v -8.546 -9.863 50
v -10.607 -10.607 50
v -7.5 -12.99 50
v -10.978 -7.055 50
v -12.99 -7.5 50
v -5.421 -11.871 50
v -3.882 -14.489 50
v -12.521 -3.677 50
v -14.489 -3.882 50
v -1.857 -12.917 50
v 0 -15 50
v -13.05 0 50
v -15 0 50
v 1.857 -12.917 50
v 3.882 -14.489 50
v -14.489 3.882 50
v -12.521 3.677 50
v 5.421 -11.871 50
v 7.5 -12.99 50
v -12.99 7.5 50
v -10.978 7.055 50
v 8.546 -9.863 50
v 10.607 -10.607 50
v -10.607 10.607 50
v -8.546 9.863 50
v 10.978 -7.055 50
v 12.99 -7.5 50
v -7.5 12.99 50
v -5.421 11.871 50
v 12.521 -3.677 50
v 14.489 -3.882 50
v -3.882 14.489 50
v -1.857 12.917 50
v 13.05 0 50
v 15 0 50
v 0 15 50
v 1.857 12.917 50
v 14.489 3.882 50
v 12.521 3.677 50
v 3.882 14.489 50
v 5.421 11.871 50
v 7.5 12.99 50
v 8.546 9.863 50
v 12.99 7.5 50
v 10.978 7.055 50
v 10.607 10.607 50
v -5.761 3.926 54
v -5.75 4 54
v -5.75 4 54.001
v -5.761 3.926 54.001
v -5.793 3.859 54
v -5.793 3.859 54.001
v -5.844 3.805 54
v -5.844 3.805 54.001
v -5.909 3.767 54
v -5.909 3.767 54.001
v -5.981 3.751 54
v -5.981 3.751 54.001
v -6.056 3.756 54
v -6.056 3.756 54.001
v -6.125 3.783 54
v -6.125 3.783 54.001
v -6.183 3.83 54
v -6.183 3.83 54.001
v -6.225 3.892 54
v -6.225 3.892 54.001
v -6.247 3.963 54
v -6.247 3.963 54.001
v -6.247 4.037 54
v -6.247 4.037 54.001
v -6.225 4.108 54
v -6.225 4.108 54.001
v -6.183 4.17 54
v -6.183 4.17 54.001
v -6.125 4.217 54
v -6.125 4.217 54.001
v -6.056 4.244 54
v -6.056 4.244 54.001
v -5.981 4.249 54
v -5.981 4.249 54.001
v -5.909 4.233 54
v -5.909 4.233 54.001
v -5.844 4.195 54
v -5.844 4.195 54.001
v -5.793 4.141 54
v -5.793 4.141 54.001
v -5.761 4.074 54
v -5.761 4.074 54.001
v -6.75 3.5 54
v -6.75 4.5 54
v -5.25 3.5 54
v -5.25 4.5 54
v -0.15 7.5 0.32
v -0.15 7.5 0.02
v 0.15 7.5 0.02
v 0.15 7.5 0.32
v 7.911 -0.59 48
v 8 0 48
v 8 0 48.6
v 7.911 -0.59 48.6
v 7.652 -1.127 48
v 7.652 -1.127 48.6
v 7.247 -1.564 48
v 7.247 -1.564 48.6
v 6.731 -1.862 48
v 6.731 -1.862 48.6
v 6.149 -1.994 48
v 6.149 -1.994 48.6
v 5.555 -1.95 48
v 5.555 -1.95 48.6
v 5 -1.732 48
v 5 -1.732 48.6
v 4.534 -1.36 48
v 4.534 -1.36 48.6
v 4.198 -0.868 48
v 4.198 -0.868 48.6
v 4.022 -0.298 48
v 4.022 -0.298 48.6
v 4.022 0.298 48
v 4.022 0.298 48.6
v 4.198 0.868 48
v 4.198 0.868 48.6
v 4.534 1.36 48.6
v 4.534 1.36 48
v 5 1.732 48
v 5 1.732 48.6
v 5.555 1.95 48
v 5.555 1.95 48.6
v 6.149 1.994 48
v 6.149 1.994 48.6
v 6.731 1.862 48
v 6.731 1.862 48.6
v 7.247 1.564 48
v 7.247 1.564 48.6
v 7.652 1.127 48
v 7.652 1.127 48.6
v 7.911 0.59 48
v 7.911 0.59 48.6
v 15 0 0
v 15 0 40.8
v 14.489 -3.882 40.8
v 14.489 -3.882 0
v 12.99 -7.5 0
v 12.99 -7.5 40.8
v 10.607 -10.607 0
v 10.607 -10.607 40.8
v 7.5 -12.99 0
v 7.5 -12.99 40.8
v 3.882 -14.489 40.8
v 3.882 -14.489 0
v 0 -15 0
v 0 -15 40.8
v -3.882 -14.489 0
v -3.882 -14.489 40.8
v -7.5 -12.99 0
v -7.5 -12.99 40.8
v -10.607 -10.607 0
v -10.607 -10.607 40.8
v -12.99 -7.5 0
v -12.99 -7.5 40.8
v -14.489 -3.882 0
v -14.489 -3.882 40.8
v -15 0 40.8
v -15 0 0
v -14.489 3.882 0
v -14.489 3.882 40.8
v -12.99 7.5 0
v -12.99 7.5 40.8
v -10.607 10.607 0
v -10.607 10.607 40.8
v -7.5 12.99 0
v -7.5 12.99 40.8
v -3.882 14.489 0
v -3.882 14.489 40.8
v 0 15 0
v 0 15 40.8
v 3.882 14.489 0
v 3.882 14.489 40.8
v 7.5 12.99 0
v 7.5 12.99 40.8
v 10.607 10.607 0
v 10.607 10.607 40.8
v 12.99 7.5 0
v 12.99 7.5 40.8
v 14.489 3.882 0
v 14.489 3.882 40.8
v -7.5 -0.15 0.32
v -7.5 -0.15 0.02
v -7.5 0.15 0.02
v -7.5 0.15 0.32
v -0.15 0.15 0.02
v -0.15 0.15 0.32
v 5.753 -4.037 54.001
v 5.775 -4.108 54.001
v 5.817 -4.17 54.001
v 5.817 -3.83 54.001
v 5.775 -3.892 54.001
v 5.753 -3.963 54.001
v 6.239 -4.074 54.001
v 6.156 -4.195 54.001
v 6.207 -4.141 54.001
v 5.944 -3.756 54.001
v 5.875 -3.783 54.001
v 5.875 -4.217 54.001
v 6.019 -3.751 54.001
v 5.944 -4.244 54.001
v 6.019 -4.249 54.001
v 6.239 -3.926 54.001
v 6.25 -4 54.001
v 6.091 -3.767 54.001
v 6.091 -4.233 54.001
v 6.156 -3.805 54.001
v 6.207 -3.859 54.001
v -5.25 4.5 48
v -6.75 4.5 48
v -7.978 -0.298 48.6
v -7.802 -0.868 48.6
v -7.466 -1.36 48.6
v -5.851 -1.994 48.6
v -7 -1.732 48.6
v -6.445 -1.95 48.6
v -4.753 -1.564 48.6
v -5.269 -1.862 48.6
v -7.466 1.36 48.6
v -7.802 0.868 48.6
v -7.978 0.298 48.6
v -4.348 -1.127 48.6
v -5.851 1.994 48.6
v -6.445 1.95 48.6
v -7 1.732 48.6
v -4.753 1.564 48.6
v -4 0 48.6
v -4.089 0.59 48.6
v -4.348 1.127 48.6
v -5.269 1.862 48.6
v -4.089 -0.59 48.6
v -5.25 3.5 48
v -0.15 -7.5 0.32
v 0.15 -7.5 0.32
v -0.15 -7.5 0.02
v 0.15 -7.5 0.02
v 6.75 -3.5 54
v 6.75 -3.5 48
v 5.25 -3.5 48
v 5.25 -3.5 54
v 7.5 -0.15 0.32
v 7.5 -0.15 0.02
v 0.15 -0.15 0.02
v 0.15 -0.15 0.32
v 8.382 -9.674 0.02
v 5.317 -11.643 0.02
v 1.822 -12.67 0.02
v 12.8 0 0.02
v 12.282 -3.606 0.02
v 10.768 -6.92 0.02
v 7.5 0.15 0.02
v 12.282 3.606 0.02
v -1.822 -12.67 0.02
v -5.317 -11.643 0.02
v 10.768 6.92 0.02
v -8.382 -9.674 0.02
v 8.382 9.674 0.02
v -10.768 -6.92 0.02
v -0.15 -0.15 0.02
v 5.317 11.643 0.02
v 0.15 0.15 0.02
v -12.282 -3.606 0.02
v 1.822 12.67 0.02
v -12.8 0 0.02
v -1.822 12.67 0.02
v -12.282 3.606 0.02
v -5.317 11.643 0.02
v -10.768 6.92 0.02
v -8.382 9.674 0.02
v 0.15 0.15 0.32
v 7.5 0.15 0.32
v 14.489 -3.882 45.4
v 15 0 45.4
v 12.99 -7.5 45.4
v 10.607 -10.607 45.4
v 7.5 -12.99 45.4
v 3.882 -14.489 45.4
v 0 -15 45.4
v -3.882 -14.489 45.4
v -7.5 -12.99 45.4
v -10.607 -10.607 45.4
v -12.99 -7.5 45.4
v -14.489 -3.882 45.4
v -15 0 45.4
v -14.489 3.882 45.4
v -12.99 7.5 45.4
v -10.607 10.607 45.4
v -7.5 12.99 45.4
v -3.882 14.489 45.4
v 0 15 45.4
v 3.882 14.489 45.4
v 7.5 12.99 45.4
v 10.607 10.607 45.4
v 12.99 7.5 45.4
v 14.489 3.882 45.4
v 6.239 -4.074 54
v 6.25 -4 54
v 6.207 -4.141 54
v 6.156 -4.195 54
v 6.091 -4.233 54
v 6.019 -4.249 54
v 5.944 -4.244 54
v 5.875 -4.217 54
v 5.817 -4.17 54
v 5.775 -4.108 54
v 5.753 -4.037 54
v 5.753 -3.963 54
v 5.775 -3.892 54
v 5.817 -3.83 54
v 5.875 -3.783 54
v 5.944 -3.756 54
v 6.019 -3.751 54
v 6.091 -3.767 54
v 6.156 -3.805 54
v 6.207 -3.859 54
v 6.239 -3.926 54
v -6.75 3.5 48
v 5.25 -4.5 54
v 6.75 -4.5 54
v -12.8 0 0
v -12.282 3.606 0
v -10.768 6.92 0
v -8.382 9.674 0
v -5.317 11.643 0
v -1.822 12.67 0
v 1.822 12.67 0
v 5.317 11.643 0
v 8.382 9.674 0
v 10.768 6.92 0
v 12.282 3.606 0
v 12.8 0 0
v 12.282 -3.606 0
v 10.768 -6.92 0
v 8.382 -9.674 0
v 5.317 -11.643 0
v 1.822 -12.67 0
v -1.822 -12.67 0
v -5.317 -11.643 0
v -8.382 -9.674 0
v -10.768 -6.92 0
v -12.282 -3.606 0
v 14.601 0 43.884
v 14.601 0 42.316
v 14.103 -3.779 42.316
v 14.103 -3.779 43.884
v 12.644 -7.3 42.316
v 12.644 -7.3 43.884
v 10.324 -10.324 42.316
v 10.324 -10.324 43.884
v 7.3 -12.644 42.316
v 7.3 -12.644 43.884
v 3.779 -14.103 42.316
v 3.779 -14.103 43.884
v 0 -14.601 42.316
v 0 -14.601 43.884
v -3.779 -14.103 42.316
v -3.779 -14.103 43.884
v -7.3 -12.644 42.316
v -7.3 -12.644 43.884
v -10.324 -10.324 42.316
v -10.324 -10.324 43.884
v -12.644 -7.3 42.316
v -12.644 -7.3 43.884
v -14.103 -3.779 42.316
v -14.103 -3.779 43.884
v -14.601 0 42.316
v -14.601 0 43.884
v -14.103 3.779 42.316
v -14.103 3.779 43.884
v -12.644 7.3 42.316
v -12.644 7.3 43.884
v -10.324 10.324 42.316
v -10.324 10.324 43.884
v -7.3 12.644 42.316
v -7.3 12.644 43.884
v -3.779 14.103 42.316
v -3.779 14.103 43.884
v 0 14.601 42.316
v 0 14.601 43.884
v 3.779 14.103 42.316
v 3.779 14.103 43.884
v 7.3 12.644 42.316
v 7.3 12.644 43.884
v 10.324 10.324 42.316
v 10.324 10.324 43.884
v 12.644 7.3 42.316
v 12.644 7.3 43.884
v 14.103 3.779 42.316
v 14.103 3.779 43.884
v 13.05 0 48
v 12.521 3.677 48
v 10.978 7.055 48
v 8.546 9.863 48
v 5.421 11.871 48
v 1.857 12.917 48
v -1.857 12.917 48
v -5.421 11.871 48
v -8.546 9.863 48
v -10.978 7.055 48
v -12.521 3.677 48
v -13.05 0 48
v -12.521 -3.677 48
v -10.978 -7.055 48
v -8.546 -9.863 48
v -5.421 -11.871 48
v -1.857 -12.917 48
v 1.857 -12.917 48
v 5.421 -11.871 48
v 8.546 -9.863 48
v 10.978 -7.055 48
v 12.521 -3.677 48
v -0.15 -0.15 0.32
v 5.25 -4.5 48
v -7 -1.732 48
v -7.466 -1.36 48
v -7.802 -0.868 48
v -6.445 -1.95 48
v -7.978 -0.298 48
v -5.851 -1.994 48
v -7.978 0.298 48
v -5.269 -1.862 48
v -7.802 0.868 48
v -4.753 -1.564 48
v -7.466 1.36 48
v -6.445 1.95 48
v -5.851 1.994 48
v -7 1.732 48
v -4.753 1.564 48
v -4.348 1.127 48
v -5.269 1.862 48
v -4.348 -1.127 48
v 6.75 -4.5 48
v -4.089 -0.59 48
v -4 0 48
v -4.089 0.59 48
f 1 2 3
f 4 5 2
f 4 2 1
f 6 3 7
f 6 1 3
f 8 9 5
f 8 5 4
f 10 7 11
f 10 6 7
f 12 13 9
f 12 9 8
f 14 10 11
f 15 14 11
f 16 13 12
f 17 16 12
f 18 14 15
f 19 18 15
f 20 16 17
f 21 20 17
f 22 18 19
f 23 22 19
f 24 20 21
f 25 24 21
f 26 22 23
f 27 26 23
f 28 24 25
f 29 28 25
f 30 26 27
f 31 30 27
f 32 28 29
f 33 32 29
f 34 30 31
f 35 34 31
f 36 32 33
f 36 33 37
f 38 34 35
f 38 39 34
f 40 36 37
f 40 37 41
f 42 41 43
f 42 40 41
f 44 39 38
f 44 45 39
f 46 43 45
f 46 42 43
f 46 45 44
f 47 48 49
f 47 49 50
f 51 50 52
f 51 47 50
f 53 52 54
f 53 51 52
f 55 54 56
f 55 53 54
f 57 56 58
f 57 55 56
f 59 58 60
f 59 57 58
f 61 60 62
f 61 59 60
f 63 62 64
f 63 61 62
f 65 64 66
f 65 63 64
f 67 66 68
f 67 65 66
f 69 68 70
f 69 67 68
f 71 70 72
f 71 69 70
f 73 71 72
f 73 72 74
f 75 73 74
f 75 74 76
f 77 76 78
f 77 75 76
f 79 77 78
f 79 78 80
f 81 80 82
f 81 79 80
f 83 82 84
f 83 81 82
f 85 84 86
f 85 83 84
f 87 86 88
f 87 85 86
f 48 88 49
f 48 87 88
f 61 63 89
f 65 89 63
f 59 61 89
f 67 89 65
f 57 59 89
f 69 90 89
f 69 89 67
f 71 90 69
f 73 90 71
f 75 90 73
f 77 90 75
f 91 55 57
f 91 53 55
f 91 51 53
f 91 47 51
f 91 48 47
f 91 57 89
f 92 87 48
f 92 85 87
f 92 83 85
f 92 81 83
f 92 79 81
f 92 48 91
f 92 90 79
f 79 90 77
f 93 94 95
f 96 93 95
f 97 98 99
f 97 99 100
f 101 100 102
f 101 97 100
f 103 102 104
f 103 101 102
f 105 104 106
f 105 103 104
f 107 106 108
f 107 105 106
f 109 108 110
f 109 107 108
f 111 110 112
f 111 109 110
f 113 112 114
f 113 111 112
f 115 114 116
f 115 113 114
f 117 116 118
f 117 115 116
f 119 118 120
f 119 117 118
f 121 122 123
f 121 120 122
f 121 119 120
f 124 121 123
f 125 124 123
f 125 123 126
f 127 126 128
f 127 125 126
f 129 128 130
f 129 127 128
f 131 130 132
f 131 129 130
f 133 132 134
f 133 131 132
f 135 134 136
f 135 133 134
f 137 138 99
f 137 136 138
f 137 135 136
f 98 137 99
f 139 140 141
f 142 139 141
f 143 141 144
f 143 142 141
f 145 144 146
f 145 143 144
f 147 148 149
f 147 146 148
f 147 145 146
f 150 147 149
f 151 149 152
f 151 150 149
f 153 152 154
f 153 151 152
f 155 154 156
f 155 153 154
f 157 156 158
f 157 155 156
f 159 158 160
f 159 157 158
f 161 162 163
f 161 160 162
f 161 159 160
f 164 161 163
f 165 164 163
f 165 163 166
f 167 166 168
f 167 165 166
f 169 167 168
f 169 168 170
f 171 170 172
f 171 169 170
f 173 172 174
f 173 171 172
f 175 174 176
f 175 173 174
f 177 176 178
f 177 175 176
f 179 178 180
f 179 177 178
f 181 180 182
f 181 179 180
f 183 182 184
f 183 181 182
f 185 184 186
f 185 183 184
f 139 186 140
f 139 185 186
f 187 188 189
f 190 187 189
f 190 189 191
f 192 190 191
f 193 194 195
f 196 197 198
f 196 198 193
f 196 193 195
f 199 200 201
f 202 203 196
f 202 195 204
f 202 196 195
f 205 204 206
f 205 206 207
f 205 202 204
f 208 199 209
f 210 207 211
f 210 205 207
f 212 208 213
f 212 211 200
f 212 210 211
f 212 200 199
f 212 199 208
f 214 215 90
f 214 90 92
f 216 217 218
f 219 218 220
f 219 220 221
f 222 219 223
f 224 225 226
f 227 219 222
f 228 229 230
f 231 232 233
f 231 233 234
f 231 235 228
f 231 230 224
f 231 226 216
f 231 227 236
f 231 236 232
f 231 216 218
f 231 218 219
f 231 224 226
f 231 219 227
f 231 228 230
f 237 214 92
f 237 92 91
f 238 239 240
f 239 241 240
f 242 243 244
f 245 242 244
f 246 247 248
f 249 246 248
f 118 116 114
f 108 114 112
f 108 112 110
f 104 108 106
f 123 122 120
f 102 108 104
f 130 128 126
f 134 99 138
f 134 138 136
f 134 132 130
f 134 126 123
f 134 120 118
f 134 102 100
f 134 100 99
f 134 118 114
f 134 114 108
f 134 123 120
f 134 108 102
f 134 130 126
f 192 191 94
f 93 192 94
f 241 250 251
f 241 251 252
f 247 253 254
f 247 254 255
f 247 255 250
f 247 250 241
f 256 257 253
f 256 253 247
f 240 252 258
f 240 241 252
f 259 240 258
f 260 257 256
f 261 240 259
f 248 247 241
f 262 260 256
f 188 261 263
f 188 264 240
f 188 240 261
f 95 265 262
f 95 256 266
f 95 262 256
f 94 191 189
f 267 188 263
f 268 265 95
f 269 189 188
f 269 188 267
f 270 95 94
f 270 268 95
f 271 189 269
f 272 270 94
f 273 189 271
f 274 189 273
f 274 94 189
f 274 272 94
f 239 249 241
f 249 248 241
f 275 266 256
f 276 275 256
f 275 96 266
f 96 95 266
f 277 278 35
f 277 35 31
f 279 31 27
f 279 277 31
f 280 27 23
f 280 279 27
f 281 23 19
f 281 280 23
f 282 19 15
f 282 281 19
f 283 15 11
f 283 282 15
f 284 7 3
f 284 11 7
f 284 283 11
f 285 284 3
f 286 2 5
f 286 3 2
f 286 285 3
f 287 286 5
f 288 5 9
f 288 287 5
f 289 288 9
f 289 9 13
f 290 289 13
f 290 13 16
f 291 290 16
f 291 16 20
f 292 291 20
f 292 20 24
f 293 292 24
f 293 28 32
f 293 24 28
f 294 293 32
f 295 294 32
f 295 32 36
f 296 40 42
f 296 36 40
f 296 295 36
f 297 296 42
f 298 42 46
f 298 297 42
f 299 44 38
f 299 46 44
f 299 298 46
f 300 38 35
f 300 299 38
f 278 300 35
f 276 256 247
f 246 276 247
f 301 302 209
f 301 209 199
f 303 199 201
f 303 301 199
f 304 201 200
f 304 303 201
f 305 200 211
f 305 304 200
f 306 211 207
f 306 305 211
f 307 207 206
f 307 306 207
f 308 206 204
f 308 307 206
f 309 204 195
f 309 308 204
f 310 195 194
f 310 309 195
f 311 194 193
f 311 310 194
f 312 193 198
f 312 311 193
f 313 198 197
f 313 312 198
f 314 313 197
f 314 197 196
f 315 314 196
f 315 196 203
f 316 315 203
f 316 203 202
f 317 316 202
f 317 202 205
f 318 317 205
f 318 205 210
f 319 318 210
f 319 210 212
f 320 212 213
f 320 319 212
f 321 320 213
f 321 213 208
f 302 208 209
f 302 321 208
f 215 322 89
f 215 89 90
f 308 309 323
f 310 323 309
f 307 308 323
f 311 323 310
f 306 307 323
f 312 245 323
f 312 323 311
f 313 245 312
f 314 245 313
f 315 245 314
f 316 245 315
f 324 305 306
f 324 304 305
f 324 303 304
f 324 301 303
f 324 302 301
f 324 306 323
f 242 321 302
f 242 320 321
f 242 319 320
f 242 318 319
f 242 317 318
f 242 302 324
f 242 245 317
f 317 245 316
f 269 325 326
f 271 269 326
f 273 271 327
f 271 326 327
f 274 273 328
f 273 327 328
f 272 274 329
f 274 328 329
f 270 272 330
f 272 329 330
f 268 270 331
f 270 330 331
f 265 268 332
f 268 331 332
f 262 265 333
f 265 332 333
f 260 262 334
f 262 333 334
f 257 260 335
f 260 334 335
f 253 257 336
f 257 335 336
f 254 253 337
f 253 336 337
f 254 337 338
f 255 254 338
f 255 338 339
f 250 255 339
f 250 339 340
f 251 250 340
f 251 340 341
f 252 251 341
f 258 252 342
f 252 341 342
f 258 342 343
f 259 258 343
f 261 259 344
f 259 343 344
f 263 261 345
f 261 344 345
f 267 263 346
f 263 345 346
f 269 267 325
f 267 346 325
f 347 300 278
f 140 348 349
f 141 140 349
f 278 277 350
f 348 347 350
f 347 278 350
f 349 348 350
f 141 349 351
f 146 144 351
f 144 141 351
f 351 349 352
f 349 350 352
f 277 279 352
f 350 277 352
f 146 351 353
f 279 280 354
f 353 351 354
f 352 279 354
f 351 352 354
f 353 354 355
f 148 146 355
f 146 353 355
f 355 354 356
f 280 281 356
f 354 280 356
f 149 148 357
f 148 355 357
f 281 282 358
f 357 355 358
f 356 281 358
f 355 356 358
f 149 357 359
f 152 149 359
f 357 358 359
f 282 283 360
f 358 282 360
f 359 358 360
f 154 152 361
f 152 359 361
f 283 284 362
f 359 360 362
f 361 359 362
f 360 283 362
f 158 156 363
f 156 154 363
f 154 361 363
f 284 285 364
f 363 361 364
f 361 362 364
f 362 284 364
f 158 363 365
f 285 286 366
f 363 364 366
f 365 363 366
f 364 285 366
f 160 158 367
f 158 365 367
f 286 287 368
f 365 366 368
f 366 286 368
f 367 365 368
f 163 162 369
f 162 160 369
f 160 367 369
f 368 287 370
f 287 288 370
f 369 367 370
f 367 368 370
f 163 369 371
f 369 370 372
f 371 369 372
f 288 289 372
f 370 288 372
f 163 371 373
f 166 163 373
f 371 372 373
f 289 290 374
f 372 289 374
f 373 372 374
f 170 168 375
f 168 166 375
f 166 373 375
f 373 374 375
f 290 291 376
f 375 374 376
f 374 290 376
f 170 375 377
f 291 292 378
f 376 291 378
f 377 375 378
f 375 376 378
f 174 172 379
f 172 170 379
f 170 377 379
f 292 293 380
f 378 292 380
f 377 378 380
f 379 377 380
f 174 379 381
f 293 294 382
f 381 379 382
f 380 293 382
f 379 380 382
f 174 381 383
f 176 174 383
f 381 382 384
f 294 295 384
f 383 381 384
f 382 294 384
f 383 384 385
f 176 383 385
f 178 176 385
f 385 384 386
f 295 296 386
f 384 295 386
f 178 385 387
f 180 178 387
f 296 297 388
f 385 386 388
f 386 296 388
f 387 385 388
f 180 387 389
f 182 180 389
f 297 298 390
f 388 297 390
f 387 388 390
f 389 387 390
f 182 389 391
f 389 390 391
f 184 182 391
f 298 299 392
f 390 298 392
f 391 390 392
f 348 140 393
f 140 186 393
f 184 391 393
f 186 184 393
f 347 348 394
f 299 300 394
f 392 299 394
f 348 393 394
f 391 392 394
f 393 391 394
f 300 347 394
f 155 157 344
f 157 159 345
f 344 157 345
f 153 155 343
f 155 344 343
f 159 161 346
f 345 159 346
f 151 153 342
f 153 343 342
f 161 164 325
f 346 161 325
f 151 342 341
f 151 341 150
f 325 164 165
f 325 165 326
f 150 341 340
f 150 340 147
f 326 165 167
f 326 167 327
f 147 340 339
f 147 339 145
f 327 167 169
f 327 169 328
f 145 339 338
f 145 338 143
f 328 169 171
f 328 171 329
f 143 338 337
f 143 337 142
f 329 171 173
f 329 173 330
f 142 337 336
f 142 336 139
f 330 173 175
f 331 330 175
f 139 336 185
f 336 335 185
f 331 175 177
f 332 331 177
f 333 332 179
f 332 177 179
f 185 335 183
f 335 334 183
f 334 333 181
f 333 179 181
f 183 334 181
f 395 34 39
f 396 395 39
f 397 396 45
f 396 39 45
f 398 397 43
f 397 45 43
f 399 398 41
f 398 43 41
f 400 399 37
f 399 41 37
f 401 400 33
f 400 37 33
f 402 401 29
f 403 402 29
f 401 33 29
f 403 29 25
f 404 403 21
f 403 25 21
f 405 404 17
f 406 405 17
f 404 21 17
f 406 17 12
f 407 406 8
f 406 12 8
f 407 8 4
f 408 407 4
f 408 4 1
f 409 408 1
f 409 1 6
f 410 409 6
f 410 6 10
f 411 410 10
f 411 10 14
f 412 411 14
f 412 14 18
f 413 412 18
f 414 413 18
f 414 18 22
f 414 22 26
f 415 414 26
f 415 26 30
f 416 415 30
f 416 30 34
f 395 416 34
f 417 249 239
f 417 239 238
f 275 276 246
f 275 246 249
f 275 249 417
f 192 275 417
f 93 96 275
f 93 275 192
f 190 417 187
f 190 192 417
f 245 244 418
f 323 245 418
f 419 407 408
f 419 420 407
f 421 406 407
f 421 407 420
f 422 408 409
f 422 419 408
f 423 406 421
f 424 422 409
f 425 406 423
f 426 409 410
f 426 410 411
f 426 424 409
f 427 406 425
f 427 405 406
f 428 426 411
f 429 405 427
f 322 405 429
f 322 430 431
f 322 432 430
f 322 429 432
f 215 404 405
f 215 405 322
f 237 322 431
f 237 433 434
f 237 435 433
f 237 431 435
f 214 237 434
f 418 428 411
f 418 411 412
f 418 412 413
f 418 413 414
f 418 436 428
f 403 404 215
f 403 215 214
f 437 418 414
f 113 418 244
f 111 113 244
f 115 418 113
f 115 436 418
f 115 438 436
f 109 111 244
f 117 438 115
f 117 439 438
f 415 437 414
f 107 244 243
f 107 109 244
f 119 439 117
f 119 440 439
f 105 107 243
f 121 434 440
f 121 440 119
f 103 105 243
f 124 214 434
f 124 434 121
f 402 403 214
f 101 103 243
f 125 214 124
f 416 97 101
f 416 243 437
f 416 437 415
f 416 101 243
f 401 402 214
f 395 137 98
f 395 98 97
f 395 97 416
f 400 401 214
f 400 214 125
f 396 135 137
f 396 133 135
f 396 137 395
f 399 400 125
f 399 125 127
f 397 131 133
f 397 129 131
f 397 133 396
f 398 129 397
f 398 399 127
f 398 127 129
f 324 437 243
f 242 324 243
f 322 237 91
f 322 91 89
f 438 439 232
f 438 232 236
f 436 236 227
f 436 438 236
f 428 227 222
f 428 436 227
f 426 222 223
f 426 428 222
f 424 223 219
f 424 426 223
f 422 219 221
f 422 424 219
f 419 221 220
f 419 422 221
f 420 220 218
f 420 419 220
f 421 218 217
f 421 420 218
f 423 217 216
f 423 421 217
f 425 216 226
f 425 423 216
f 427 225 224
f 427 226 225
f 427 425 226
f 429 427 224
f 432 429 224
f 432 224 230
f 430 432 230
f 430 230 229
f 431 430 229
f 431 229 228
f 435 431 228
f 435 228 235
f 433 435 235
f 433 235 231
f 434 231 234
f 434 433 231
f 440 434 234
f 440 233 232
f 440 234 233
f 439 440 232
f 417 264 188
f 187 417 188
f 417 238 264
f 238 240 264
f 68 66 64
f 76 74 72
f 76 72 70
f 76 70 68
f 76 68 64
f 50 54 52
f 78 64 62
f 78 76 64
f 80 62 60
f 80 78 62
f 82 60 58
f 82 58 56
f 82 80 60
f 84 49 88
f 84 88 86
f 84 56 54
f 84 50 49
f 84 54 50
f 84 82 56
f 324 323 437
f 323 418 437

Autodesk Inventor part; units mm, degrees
ref_plane "YZ Plane" through (0, 0, 0) normal (1, 0, 0) x (0, 1, 0)
ref_plane "XZ Plane" through (0, 0, 0) normal (0, 1, 0) x (-1, 0, 0)
sketch "Skizze1" plane through (0, 0, 0) normal (0, 1, 0) x (-1, 0, 0)
  line L0 (0, 0) -> (0, 50)
  line L1 (0, 50) -> (-15, 50)
  line L2 (-15, 50) -> (-15, 45.4)
  line L3 (-15, 40.8) -> (-15, 0)
  arc A0 (-15, 40.8) -> (-15, 45.4) centre (-20.6528, 43.1) ccw
  line L4 (0, 0) -> (-15, 0)
  line L5 (0, -10) -> (0, 60) projected
  dimension "d0" = 50
  dimension "d1" = 15
  dimension "d2" = 4.6
  dimension "d72" = 14.55
  dimension "d73" = 4.6
revolve "Umdrehung1" add sketch "Skizze1" angle 360 about axis through (0, 0, -10) along (0, 0, 1)
sketch "Skizze3" plane through (0, 0, 50) normal (0, 0, 1) x (1, 0, 0)
  circle A0 centre (0, 0) radius 13.05
  dimension "d10" = 26.1
extrude "Extrusion2" cut sketch "Skizze3" against normal blind 2
sketch "Skizze7" plane through (0, 0, 0) normal (0, 0, -1) x (-1, 0, 0)
  circle A0 centre (0, 0) radius 12.8
  dimension "d19" = 25.6
extrude "Extrusion4" cut sketch "Skizze7" against normal blind 0.02
sketch "Skizze17" plane through (0, 0, 48) normal (0, 0, 1) x (1, 0, 0)
  line L0 (-4.2414, 0) -> (6, 0) construction
  line L1 (6, 0) -> (-6, 0) construction
  line L2 (6, 0) -> (6, -3.5) construction
  line L3 (-6, 0) -> (-6, 3.5) construction
  line L4 (-6, 3.5) -> (6, -3.5) construction
  circle A0 centre (-6, 0) radius 2
  circle A1 centre (6, 0) radius 2
  line L5 (-6.75, 4.5) -> (-5.25, 4.5)
  line L6 (-5.25, 4.5) -> (-5.25, 3.5)
  line L7 (-5.25, 3.5) -> (-6.75, 3.5)
  line L8 (-6.75, 3.5) -> (-6.75, 4.5)
  line L9 (6.75, -3.5) -> (5.25, -3.5)
  line L10 (5.25, -3.5) -> (5.25, -4.5)
  line L11 (5.25, -4.5) -> (6.75, -4.5)
  line L12 (6.75, -4.5) -> (6.75, -3.5)
  point P0 (0, 0)
  point P1 (0, 0)
  dimension "d54" = 12
  dimension "d55" = 3.5
  dimension "d56" = 3.5
  dimension "d57" = 4
  dimension "d58" = 4
  dimension "d59" = 1.5
  dimension "d60" = 1
  dimension "d61" = 1.5
  dimension "d62" = 1
extrude "Extrusion8" add sketch "Skizze17" along normal blind 0.6 contours A0 | A1
sketch "Skizze18" plane through (0, 0, 48) normal (0, 0, 1) x (1, 0, 0)
  line L0 (-6.75, 4.5) -> (-5.25, 4.5)
  line L1 (-5.25, 4.5) -> (-5.25, 3.5)
  line L2 (-5.25, 3.5) -> (-6.75, 3.5)
  line L3 (-6.75, 3.5) -> (-6.75, 4.5)
  line L4 (6.75, -3.5) -> (5.25, -3.5)
  line L5 (5.25, -3.5) -> (5.25, -4.5)
  line L6 (5.25, -4.5) -> (6.75, -4.5)
  line L7 (6.75, -4.5) -> (6.75, -3.5)
  point P0 (0, 0)
  point P1 (-6, 3.5)
  point P2 (6, -3.5)
  dimension "d66" = 1.5
  dimension "d67" = 1
  dimension "d68" = 1.5
  dimension "d69" = 1
extrude "Extrusion9" add sketch "Skizze18" along normal blind 6
sketch "Skizze9" plane through (0, 0, 0.02) normal (0, 0, -1) x (-1, 0, 0)
  line L0 (-7.5, 0) -> (7.5, 0) construction
  line L1 (0, 4.0384) -> (0, 7.5) construction
  line L2 (0, 7.5) -> (0, -7.5) construction
  line L3 (0.15, 7.5) -> (-0.15, 7.5)
  line L4 (-0.15, 7.5) -> (-0.15, 0.15)
  line L5 (-0.15, 0.15) -> (-7.5, 0.15)
  line L6 (-7.5, 0.15) -> (-7.5, -0.15)
  line L7 (-7.5, -0.15) -> (-0.15, -0.15)
  line L8 (-0.15, -0.15) -> (-0.15, -7.5)
  line L9 (-0.15, -7.5) -> (0.15, -7.5)
  line L10 (0.15, -7.5) -> (0.15, -0.15)
  line L11 (0.15, -0.15) -> (7.5, -0.15)
  line L12 (7.5, -0.15) -> (7.5, 0.15)
  line L13 (7.5, 0.15) -> (0.15, 0.15)
  line L14 (0.15, 0.15) -> (0.15, 7.5)
  point P0 (0, 0)
  point P1 (0, 0)
  dimension "d23" = 15
  dimension "d24" = 15
  dimension "d74" = 0.3
extrude "Extrusion10" cut sketch "Skizze9" against normal blind 0.3
sketch "Skizze19" plane through (0, 0, 54) normal (0, 0, 1) x (1, 0, 0)
  line L0 (6.75, -3.5) -> (5.25, -3.5) projected
  line L1 (6.75, -3.5) -> (5.25, -3.5) projected
  line L2 (5.25, -3.5) -> (5.25, -4.5) projected
  line L3 (5.25, -4.5) -> (6.75, -4.5) projected
  line L4 (6.75, -4.5) -> (6.75, -3.5) projected
  line L5 (5.25, -3.5) -> (6.75, -4.5) construction
  circle A0 centre (6, -4) radius 0.25
  line L6 (-5.25, 3.5) -> (-5.25, 4.5) projected
  line L7 (-5.25, 4.5) -> (-6.75, 4.5) projected
  line L8 (-6.75, 4.5) -> (-6.75, 3.5) projected
  line L9 (-6.75, 3.5) -> (-5.25, 3.5) projected
  line L10 (-5.25, 4.5) -> (-6.75, 4.5) construction
  line L11 (-6.75, 4.5) -> (-5.25, 3.5) construction
  circle A1 centre (-6, 4) radius 0.25
  point P0 (0, 0)
  dimension "d77" = 0.5
  dimension "d78" = 0.5
extrude "Extrusion11" add sketch "Skizze19" along normal blind 0.001 contours A0 | A1
ref_plane "Arbeitsebene1" through (-6, 4, 54.001) normal (0.5547, 0.8321, 0) x (0, 0, 1)
properties part number "capacitor (LGN2X151MELB50)"
